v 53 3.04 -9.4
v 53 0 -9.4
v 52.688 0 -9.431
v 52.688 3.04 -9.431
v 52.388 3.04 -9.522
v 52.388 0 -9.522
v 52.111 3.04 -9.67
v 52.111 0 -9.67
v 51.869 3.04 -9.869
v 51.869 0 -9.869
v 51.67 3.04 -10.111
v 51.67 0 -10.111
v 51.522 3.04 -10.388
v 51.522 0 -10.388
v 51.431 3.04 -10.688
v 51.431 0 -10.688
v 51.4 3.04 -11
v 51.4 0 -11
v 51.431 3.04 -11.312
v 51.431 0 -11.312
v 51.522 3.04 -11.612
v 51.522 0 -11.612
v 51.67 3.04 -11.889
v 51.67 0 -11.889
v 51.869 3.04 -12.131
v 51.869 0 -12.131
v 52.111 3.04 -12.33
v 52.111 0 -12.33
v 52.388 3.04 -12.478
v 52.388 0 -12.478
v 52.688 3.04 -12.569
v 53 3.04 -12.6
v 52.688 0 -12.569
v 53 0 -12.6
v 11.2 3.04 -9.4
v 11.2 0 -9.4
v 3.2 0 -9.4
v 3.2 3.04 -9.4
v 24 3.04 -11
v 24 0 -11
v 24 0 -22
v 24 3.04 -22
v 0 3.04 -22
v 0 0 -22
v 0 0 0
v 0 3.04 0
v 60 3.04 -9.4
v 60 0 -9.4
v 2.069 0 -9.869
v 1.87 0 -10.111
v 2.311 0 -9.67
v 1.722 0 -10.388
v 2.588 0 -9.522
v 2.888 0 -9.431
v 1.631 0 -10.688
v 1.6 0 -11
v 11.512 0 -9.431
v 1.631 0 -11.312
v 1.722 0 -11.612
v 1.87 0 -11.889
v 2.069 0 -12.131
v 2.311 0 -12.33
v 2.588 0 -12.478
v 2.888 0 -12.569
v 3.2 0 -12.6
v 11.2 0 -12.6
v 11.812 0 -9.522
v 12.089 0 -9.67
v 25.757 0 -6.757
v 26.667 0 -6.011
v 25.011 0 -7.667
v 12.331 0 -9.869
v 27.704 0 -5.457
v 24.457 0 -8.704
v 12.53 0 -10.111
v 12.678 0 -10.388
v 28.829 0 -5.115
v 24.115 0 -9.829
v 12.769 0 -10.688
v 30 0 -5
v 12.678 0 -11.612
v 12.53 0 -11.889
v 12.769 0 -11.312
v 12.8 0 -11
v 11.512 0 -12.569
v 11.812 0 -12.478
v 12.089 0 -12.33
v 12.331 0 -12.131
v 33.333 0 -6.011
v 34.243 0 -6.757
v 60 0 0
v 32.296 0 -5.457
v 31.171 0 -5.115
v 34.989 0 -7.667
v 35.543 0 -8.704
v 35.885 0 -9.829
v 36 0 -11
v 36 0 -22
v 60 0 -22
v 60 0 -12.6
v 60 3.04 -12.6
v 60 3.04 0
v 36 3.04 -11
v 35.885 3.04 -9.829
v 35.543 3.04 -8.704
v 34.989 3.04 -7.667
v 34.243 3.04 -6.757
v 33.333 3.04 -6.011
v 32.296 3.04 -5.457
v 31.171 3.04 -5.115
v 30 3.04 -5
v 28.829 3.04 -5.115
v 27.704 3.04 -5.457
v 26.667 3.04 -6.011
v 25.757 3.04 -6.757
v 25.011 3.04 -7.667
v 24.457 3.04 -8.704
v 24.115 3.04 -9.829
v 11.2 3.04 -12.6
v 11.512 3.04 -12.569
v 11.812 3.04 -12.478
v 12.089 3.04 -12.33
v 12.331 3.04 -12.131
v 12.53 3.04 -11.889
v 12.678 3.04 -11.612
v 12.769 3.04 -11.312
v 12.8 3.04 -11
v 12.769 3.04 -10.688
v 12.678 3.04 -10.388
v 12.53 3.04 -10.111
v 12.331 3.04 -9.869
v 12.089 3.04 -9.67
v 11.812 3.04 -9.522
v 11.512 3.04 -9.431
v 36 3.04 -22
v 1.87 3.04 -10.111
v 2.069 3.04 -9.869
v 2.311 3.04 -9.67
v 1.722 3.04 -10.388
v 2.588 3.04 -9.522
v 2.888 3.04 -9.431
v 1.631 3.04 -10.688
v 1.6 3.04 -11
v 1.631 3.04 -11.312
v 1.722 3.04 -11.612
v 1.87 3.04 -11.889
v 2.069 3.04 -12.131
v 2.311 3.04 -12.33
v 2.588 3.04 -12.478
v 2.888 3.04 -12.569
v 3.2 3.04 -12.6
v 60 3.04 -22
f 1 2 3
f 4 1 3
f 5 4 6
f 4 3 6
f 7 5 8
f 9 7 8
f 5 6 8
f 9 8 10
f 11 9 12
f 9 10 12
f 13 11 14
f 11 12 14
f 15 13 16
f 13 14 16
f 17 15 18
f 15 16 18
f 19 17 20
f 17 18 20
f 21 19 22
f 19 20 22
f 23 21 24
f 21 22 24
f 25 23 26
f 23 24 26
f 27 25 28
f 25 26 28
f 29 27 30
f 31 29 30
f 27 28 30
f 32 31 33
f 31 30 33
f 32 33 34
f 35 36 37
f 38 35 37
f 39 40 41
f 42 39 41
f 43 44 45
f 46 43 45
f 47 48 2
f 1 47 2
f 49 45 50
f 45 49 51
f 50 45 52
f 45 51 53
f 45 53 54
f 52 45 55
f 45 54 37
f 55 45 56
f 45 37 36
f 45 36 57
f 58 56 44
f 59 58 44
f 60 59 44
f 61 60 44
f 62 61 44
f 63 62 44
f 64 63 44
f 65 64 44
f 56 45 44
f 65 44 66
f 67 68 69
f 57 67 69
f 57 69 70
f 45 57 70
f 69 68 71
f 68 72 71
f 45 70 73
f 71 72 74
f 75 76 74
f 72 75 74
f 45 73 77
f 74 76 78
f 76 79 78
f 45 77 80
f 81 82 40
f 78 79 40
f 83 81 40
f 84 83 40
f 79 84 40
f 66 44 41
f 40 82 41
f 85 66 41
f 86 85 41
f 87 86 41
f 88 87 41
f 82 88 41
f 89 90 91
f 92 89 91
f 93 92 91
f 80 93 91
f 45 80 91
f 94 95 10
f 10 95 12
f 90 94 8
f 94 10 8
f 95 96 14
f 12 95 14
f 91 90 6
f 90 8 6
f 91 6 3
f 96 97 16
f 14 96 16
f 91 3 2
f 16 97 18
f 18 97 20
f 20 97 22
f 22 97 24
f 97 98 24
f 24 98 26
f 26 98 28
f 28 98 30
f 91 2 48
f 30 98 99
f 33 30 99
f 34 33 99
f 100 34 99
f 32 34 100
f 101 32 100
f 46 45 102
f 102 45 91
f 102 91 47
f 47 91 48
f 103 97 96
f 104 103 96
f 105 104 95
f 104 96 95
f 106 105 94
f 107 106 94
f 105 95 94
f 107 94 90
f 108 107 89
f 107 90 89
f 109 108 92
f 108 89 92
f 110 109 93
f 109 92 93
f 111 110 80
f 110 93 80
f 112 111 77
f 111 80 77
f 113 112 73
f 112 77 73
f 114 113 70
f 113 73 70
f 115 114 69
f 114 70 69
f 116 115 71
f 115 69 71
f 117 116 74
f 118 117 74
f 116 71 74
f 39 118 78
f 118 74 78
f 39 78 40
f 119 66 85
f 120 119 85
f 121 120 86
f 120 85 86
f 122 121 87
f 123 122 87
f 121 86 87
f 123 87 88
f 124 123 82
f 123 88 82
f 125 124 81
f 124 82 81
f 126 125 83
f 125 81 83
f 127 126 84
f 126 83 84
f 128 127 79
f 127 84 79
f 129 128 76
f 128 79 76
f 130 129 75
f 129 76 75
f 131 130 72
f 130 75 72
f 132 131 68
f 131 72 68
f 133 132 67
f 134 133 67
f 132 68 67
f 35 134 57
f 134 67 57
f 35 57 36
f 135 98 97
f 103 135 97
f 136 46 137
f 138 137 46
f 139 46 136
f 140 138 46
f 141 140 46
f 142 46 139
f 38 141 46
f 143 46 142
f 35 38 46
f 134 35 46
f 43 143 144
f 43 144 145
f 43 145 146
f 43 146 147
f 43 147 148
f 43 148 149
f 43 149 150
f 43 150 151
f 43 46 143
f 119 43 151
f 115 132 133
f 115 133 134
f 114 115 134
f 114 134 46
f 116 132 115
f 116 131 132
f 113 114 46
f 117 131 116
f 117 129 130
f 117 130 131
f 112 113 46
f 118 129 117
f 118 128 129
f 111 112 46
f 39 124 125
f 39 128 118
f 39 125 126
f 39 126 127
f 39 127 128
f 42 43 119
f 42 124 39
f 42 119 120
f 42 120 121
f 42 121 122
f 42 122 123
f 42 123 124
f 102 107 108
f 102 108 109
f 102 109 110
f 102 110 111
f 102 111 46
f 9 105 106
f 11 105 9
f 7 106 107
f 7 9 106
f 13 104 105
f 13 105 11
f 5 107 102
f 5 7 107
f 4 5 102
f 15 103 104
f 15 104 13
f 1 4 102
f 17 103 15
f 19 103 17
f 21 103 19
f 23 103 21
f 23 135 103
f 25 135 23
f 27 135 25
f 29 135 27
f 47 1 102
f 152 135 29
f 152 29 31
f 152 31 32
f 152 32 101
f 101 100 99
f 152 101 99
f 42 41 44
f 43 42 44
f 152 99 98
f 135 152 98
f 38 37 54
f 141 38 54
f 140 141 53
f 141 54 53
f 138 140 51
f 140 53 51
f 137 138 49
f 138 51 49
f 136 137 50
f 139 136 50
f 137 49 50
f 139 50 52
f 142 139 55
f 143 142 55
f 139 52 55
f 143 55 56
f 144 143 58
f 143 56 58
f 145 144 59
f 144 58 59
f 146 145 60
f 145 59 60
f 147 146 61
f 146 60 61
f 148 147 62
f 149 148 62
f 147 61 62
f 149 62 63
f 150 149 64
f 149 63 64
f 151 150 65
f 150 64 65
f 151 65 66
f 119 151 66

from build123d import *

# Parameters (mm, degrees)
BOSS_EXTRUDE1_DEPTH = 3.04


with BuildPart() as part:
    # Sketch1 → Boss-Extrude1 (new body)
    with BuildSketch(Plane(origin=(0, 0, 0), x_dir=(1, 0, 0), z_dir=(0, 1, 0))):
        with BuildLine():
            Line((0, 0), (60, 0))
            Line((60, 0), (60, 9.4))
            Line((60, 9.4), (53, 9.4))
            ThreePointArc((53, 9.4), (51.4, 11), (53, 12.6))
            Line((53, 12.6), (60, 12.6))
            Line((60, 12.6), (60, 22))
            Line((60, 22), (36, 22))
            Line((36, 22), (36, 11))
            ThreePointArc((36, 11), (30, 5), (24, 11))
            Line((24, 11), (24, 22))
            Line((24, 22), (0, 22))
            Line((0, 22), (0, 0))
        make_face()
        with BuildLine():
            Line((3.2, 12.6), (11.2, 12.6))
            ThreePointArc((11.2, 12.6), (12.8, 11), (11.2, 9.4))
            Line((11.2, 9.4), (3.2, 9.4))
            ThreePointArc((3.2, 9.4), (1.6, 11), (3.2, 12.6))
        make_face(mode=Mode.SUBTRACT)
    extrude(amount=BOSS_EXTRUDE1_DEPTH)


solid = part.part
